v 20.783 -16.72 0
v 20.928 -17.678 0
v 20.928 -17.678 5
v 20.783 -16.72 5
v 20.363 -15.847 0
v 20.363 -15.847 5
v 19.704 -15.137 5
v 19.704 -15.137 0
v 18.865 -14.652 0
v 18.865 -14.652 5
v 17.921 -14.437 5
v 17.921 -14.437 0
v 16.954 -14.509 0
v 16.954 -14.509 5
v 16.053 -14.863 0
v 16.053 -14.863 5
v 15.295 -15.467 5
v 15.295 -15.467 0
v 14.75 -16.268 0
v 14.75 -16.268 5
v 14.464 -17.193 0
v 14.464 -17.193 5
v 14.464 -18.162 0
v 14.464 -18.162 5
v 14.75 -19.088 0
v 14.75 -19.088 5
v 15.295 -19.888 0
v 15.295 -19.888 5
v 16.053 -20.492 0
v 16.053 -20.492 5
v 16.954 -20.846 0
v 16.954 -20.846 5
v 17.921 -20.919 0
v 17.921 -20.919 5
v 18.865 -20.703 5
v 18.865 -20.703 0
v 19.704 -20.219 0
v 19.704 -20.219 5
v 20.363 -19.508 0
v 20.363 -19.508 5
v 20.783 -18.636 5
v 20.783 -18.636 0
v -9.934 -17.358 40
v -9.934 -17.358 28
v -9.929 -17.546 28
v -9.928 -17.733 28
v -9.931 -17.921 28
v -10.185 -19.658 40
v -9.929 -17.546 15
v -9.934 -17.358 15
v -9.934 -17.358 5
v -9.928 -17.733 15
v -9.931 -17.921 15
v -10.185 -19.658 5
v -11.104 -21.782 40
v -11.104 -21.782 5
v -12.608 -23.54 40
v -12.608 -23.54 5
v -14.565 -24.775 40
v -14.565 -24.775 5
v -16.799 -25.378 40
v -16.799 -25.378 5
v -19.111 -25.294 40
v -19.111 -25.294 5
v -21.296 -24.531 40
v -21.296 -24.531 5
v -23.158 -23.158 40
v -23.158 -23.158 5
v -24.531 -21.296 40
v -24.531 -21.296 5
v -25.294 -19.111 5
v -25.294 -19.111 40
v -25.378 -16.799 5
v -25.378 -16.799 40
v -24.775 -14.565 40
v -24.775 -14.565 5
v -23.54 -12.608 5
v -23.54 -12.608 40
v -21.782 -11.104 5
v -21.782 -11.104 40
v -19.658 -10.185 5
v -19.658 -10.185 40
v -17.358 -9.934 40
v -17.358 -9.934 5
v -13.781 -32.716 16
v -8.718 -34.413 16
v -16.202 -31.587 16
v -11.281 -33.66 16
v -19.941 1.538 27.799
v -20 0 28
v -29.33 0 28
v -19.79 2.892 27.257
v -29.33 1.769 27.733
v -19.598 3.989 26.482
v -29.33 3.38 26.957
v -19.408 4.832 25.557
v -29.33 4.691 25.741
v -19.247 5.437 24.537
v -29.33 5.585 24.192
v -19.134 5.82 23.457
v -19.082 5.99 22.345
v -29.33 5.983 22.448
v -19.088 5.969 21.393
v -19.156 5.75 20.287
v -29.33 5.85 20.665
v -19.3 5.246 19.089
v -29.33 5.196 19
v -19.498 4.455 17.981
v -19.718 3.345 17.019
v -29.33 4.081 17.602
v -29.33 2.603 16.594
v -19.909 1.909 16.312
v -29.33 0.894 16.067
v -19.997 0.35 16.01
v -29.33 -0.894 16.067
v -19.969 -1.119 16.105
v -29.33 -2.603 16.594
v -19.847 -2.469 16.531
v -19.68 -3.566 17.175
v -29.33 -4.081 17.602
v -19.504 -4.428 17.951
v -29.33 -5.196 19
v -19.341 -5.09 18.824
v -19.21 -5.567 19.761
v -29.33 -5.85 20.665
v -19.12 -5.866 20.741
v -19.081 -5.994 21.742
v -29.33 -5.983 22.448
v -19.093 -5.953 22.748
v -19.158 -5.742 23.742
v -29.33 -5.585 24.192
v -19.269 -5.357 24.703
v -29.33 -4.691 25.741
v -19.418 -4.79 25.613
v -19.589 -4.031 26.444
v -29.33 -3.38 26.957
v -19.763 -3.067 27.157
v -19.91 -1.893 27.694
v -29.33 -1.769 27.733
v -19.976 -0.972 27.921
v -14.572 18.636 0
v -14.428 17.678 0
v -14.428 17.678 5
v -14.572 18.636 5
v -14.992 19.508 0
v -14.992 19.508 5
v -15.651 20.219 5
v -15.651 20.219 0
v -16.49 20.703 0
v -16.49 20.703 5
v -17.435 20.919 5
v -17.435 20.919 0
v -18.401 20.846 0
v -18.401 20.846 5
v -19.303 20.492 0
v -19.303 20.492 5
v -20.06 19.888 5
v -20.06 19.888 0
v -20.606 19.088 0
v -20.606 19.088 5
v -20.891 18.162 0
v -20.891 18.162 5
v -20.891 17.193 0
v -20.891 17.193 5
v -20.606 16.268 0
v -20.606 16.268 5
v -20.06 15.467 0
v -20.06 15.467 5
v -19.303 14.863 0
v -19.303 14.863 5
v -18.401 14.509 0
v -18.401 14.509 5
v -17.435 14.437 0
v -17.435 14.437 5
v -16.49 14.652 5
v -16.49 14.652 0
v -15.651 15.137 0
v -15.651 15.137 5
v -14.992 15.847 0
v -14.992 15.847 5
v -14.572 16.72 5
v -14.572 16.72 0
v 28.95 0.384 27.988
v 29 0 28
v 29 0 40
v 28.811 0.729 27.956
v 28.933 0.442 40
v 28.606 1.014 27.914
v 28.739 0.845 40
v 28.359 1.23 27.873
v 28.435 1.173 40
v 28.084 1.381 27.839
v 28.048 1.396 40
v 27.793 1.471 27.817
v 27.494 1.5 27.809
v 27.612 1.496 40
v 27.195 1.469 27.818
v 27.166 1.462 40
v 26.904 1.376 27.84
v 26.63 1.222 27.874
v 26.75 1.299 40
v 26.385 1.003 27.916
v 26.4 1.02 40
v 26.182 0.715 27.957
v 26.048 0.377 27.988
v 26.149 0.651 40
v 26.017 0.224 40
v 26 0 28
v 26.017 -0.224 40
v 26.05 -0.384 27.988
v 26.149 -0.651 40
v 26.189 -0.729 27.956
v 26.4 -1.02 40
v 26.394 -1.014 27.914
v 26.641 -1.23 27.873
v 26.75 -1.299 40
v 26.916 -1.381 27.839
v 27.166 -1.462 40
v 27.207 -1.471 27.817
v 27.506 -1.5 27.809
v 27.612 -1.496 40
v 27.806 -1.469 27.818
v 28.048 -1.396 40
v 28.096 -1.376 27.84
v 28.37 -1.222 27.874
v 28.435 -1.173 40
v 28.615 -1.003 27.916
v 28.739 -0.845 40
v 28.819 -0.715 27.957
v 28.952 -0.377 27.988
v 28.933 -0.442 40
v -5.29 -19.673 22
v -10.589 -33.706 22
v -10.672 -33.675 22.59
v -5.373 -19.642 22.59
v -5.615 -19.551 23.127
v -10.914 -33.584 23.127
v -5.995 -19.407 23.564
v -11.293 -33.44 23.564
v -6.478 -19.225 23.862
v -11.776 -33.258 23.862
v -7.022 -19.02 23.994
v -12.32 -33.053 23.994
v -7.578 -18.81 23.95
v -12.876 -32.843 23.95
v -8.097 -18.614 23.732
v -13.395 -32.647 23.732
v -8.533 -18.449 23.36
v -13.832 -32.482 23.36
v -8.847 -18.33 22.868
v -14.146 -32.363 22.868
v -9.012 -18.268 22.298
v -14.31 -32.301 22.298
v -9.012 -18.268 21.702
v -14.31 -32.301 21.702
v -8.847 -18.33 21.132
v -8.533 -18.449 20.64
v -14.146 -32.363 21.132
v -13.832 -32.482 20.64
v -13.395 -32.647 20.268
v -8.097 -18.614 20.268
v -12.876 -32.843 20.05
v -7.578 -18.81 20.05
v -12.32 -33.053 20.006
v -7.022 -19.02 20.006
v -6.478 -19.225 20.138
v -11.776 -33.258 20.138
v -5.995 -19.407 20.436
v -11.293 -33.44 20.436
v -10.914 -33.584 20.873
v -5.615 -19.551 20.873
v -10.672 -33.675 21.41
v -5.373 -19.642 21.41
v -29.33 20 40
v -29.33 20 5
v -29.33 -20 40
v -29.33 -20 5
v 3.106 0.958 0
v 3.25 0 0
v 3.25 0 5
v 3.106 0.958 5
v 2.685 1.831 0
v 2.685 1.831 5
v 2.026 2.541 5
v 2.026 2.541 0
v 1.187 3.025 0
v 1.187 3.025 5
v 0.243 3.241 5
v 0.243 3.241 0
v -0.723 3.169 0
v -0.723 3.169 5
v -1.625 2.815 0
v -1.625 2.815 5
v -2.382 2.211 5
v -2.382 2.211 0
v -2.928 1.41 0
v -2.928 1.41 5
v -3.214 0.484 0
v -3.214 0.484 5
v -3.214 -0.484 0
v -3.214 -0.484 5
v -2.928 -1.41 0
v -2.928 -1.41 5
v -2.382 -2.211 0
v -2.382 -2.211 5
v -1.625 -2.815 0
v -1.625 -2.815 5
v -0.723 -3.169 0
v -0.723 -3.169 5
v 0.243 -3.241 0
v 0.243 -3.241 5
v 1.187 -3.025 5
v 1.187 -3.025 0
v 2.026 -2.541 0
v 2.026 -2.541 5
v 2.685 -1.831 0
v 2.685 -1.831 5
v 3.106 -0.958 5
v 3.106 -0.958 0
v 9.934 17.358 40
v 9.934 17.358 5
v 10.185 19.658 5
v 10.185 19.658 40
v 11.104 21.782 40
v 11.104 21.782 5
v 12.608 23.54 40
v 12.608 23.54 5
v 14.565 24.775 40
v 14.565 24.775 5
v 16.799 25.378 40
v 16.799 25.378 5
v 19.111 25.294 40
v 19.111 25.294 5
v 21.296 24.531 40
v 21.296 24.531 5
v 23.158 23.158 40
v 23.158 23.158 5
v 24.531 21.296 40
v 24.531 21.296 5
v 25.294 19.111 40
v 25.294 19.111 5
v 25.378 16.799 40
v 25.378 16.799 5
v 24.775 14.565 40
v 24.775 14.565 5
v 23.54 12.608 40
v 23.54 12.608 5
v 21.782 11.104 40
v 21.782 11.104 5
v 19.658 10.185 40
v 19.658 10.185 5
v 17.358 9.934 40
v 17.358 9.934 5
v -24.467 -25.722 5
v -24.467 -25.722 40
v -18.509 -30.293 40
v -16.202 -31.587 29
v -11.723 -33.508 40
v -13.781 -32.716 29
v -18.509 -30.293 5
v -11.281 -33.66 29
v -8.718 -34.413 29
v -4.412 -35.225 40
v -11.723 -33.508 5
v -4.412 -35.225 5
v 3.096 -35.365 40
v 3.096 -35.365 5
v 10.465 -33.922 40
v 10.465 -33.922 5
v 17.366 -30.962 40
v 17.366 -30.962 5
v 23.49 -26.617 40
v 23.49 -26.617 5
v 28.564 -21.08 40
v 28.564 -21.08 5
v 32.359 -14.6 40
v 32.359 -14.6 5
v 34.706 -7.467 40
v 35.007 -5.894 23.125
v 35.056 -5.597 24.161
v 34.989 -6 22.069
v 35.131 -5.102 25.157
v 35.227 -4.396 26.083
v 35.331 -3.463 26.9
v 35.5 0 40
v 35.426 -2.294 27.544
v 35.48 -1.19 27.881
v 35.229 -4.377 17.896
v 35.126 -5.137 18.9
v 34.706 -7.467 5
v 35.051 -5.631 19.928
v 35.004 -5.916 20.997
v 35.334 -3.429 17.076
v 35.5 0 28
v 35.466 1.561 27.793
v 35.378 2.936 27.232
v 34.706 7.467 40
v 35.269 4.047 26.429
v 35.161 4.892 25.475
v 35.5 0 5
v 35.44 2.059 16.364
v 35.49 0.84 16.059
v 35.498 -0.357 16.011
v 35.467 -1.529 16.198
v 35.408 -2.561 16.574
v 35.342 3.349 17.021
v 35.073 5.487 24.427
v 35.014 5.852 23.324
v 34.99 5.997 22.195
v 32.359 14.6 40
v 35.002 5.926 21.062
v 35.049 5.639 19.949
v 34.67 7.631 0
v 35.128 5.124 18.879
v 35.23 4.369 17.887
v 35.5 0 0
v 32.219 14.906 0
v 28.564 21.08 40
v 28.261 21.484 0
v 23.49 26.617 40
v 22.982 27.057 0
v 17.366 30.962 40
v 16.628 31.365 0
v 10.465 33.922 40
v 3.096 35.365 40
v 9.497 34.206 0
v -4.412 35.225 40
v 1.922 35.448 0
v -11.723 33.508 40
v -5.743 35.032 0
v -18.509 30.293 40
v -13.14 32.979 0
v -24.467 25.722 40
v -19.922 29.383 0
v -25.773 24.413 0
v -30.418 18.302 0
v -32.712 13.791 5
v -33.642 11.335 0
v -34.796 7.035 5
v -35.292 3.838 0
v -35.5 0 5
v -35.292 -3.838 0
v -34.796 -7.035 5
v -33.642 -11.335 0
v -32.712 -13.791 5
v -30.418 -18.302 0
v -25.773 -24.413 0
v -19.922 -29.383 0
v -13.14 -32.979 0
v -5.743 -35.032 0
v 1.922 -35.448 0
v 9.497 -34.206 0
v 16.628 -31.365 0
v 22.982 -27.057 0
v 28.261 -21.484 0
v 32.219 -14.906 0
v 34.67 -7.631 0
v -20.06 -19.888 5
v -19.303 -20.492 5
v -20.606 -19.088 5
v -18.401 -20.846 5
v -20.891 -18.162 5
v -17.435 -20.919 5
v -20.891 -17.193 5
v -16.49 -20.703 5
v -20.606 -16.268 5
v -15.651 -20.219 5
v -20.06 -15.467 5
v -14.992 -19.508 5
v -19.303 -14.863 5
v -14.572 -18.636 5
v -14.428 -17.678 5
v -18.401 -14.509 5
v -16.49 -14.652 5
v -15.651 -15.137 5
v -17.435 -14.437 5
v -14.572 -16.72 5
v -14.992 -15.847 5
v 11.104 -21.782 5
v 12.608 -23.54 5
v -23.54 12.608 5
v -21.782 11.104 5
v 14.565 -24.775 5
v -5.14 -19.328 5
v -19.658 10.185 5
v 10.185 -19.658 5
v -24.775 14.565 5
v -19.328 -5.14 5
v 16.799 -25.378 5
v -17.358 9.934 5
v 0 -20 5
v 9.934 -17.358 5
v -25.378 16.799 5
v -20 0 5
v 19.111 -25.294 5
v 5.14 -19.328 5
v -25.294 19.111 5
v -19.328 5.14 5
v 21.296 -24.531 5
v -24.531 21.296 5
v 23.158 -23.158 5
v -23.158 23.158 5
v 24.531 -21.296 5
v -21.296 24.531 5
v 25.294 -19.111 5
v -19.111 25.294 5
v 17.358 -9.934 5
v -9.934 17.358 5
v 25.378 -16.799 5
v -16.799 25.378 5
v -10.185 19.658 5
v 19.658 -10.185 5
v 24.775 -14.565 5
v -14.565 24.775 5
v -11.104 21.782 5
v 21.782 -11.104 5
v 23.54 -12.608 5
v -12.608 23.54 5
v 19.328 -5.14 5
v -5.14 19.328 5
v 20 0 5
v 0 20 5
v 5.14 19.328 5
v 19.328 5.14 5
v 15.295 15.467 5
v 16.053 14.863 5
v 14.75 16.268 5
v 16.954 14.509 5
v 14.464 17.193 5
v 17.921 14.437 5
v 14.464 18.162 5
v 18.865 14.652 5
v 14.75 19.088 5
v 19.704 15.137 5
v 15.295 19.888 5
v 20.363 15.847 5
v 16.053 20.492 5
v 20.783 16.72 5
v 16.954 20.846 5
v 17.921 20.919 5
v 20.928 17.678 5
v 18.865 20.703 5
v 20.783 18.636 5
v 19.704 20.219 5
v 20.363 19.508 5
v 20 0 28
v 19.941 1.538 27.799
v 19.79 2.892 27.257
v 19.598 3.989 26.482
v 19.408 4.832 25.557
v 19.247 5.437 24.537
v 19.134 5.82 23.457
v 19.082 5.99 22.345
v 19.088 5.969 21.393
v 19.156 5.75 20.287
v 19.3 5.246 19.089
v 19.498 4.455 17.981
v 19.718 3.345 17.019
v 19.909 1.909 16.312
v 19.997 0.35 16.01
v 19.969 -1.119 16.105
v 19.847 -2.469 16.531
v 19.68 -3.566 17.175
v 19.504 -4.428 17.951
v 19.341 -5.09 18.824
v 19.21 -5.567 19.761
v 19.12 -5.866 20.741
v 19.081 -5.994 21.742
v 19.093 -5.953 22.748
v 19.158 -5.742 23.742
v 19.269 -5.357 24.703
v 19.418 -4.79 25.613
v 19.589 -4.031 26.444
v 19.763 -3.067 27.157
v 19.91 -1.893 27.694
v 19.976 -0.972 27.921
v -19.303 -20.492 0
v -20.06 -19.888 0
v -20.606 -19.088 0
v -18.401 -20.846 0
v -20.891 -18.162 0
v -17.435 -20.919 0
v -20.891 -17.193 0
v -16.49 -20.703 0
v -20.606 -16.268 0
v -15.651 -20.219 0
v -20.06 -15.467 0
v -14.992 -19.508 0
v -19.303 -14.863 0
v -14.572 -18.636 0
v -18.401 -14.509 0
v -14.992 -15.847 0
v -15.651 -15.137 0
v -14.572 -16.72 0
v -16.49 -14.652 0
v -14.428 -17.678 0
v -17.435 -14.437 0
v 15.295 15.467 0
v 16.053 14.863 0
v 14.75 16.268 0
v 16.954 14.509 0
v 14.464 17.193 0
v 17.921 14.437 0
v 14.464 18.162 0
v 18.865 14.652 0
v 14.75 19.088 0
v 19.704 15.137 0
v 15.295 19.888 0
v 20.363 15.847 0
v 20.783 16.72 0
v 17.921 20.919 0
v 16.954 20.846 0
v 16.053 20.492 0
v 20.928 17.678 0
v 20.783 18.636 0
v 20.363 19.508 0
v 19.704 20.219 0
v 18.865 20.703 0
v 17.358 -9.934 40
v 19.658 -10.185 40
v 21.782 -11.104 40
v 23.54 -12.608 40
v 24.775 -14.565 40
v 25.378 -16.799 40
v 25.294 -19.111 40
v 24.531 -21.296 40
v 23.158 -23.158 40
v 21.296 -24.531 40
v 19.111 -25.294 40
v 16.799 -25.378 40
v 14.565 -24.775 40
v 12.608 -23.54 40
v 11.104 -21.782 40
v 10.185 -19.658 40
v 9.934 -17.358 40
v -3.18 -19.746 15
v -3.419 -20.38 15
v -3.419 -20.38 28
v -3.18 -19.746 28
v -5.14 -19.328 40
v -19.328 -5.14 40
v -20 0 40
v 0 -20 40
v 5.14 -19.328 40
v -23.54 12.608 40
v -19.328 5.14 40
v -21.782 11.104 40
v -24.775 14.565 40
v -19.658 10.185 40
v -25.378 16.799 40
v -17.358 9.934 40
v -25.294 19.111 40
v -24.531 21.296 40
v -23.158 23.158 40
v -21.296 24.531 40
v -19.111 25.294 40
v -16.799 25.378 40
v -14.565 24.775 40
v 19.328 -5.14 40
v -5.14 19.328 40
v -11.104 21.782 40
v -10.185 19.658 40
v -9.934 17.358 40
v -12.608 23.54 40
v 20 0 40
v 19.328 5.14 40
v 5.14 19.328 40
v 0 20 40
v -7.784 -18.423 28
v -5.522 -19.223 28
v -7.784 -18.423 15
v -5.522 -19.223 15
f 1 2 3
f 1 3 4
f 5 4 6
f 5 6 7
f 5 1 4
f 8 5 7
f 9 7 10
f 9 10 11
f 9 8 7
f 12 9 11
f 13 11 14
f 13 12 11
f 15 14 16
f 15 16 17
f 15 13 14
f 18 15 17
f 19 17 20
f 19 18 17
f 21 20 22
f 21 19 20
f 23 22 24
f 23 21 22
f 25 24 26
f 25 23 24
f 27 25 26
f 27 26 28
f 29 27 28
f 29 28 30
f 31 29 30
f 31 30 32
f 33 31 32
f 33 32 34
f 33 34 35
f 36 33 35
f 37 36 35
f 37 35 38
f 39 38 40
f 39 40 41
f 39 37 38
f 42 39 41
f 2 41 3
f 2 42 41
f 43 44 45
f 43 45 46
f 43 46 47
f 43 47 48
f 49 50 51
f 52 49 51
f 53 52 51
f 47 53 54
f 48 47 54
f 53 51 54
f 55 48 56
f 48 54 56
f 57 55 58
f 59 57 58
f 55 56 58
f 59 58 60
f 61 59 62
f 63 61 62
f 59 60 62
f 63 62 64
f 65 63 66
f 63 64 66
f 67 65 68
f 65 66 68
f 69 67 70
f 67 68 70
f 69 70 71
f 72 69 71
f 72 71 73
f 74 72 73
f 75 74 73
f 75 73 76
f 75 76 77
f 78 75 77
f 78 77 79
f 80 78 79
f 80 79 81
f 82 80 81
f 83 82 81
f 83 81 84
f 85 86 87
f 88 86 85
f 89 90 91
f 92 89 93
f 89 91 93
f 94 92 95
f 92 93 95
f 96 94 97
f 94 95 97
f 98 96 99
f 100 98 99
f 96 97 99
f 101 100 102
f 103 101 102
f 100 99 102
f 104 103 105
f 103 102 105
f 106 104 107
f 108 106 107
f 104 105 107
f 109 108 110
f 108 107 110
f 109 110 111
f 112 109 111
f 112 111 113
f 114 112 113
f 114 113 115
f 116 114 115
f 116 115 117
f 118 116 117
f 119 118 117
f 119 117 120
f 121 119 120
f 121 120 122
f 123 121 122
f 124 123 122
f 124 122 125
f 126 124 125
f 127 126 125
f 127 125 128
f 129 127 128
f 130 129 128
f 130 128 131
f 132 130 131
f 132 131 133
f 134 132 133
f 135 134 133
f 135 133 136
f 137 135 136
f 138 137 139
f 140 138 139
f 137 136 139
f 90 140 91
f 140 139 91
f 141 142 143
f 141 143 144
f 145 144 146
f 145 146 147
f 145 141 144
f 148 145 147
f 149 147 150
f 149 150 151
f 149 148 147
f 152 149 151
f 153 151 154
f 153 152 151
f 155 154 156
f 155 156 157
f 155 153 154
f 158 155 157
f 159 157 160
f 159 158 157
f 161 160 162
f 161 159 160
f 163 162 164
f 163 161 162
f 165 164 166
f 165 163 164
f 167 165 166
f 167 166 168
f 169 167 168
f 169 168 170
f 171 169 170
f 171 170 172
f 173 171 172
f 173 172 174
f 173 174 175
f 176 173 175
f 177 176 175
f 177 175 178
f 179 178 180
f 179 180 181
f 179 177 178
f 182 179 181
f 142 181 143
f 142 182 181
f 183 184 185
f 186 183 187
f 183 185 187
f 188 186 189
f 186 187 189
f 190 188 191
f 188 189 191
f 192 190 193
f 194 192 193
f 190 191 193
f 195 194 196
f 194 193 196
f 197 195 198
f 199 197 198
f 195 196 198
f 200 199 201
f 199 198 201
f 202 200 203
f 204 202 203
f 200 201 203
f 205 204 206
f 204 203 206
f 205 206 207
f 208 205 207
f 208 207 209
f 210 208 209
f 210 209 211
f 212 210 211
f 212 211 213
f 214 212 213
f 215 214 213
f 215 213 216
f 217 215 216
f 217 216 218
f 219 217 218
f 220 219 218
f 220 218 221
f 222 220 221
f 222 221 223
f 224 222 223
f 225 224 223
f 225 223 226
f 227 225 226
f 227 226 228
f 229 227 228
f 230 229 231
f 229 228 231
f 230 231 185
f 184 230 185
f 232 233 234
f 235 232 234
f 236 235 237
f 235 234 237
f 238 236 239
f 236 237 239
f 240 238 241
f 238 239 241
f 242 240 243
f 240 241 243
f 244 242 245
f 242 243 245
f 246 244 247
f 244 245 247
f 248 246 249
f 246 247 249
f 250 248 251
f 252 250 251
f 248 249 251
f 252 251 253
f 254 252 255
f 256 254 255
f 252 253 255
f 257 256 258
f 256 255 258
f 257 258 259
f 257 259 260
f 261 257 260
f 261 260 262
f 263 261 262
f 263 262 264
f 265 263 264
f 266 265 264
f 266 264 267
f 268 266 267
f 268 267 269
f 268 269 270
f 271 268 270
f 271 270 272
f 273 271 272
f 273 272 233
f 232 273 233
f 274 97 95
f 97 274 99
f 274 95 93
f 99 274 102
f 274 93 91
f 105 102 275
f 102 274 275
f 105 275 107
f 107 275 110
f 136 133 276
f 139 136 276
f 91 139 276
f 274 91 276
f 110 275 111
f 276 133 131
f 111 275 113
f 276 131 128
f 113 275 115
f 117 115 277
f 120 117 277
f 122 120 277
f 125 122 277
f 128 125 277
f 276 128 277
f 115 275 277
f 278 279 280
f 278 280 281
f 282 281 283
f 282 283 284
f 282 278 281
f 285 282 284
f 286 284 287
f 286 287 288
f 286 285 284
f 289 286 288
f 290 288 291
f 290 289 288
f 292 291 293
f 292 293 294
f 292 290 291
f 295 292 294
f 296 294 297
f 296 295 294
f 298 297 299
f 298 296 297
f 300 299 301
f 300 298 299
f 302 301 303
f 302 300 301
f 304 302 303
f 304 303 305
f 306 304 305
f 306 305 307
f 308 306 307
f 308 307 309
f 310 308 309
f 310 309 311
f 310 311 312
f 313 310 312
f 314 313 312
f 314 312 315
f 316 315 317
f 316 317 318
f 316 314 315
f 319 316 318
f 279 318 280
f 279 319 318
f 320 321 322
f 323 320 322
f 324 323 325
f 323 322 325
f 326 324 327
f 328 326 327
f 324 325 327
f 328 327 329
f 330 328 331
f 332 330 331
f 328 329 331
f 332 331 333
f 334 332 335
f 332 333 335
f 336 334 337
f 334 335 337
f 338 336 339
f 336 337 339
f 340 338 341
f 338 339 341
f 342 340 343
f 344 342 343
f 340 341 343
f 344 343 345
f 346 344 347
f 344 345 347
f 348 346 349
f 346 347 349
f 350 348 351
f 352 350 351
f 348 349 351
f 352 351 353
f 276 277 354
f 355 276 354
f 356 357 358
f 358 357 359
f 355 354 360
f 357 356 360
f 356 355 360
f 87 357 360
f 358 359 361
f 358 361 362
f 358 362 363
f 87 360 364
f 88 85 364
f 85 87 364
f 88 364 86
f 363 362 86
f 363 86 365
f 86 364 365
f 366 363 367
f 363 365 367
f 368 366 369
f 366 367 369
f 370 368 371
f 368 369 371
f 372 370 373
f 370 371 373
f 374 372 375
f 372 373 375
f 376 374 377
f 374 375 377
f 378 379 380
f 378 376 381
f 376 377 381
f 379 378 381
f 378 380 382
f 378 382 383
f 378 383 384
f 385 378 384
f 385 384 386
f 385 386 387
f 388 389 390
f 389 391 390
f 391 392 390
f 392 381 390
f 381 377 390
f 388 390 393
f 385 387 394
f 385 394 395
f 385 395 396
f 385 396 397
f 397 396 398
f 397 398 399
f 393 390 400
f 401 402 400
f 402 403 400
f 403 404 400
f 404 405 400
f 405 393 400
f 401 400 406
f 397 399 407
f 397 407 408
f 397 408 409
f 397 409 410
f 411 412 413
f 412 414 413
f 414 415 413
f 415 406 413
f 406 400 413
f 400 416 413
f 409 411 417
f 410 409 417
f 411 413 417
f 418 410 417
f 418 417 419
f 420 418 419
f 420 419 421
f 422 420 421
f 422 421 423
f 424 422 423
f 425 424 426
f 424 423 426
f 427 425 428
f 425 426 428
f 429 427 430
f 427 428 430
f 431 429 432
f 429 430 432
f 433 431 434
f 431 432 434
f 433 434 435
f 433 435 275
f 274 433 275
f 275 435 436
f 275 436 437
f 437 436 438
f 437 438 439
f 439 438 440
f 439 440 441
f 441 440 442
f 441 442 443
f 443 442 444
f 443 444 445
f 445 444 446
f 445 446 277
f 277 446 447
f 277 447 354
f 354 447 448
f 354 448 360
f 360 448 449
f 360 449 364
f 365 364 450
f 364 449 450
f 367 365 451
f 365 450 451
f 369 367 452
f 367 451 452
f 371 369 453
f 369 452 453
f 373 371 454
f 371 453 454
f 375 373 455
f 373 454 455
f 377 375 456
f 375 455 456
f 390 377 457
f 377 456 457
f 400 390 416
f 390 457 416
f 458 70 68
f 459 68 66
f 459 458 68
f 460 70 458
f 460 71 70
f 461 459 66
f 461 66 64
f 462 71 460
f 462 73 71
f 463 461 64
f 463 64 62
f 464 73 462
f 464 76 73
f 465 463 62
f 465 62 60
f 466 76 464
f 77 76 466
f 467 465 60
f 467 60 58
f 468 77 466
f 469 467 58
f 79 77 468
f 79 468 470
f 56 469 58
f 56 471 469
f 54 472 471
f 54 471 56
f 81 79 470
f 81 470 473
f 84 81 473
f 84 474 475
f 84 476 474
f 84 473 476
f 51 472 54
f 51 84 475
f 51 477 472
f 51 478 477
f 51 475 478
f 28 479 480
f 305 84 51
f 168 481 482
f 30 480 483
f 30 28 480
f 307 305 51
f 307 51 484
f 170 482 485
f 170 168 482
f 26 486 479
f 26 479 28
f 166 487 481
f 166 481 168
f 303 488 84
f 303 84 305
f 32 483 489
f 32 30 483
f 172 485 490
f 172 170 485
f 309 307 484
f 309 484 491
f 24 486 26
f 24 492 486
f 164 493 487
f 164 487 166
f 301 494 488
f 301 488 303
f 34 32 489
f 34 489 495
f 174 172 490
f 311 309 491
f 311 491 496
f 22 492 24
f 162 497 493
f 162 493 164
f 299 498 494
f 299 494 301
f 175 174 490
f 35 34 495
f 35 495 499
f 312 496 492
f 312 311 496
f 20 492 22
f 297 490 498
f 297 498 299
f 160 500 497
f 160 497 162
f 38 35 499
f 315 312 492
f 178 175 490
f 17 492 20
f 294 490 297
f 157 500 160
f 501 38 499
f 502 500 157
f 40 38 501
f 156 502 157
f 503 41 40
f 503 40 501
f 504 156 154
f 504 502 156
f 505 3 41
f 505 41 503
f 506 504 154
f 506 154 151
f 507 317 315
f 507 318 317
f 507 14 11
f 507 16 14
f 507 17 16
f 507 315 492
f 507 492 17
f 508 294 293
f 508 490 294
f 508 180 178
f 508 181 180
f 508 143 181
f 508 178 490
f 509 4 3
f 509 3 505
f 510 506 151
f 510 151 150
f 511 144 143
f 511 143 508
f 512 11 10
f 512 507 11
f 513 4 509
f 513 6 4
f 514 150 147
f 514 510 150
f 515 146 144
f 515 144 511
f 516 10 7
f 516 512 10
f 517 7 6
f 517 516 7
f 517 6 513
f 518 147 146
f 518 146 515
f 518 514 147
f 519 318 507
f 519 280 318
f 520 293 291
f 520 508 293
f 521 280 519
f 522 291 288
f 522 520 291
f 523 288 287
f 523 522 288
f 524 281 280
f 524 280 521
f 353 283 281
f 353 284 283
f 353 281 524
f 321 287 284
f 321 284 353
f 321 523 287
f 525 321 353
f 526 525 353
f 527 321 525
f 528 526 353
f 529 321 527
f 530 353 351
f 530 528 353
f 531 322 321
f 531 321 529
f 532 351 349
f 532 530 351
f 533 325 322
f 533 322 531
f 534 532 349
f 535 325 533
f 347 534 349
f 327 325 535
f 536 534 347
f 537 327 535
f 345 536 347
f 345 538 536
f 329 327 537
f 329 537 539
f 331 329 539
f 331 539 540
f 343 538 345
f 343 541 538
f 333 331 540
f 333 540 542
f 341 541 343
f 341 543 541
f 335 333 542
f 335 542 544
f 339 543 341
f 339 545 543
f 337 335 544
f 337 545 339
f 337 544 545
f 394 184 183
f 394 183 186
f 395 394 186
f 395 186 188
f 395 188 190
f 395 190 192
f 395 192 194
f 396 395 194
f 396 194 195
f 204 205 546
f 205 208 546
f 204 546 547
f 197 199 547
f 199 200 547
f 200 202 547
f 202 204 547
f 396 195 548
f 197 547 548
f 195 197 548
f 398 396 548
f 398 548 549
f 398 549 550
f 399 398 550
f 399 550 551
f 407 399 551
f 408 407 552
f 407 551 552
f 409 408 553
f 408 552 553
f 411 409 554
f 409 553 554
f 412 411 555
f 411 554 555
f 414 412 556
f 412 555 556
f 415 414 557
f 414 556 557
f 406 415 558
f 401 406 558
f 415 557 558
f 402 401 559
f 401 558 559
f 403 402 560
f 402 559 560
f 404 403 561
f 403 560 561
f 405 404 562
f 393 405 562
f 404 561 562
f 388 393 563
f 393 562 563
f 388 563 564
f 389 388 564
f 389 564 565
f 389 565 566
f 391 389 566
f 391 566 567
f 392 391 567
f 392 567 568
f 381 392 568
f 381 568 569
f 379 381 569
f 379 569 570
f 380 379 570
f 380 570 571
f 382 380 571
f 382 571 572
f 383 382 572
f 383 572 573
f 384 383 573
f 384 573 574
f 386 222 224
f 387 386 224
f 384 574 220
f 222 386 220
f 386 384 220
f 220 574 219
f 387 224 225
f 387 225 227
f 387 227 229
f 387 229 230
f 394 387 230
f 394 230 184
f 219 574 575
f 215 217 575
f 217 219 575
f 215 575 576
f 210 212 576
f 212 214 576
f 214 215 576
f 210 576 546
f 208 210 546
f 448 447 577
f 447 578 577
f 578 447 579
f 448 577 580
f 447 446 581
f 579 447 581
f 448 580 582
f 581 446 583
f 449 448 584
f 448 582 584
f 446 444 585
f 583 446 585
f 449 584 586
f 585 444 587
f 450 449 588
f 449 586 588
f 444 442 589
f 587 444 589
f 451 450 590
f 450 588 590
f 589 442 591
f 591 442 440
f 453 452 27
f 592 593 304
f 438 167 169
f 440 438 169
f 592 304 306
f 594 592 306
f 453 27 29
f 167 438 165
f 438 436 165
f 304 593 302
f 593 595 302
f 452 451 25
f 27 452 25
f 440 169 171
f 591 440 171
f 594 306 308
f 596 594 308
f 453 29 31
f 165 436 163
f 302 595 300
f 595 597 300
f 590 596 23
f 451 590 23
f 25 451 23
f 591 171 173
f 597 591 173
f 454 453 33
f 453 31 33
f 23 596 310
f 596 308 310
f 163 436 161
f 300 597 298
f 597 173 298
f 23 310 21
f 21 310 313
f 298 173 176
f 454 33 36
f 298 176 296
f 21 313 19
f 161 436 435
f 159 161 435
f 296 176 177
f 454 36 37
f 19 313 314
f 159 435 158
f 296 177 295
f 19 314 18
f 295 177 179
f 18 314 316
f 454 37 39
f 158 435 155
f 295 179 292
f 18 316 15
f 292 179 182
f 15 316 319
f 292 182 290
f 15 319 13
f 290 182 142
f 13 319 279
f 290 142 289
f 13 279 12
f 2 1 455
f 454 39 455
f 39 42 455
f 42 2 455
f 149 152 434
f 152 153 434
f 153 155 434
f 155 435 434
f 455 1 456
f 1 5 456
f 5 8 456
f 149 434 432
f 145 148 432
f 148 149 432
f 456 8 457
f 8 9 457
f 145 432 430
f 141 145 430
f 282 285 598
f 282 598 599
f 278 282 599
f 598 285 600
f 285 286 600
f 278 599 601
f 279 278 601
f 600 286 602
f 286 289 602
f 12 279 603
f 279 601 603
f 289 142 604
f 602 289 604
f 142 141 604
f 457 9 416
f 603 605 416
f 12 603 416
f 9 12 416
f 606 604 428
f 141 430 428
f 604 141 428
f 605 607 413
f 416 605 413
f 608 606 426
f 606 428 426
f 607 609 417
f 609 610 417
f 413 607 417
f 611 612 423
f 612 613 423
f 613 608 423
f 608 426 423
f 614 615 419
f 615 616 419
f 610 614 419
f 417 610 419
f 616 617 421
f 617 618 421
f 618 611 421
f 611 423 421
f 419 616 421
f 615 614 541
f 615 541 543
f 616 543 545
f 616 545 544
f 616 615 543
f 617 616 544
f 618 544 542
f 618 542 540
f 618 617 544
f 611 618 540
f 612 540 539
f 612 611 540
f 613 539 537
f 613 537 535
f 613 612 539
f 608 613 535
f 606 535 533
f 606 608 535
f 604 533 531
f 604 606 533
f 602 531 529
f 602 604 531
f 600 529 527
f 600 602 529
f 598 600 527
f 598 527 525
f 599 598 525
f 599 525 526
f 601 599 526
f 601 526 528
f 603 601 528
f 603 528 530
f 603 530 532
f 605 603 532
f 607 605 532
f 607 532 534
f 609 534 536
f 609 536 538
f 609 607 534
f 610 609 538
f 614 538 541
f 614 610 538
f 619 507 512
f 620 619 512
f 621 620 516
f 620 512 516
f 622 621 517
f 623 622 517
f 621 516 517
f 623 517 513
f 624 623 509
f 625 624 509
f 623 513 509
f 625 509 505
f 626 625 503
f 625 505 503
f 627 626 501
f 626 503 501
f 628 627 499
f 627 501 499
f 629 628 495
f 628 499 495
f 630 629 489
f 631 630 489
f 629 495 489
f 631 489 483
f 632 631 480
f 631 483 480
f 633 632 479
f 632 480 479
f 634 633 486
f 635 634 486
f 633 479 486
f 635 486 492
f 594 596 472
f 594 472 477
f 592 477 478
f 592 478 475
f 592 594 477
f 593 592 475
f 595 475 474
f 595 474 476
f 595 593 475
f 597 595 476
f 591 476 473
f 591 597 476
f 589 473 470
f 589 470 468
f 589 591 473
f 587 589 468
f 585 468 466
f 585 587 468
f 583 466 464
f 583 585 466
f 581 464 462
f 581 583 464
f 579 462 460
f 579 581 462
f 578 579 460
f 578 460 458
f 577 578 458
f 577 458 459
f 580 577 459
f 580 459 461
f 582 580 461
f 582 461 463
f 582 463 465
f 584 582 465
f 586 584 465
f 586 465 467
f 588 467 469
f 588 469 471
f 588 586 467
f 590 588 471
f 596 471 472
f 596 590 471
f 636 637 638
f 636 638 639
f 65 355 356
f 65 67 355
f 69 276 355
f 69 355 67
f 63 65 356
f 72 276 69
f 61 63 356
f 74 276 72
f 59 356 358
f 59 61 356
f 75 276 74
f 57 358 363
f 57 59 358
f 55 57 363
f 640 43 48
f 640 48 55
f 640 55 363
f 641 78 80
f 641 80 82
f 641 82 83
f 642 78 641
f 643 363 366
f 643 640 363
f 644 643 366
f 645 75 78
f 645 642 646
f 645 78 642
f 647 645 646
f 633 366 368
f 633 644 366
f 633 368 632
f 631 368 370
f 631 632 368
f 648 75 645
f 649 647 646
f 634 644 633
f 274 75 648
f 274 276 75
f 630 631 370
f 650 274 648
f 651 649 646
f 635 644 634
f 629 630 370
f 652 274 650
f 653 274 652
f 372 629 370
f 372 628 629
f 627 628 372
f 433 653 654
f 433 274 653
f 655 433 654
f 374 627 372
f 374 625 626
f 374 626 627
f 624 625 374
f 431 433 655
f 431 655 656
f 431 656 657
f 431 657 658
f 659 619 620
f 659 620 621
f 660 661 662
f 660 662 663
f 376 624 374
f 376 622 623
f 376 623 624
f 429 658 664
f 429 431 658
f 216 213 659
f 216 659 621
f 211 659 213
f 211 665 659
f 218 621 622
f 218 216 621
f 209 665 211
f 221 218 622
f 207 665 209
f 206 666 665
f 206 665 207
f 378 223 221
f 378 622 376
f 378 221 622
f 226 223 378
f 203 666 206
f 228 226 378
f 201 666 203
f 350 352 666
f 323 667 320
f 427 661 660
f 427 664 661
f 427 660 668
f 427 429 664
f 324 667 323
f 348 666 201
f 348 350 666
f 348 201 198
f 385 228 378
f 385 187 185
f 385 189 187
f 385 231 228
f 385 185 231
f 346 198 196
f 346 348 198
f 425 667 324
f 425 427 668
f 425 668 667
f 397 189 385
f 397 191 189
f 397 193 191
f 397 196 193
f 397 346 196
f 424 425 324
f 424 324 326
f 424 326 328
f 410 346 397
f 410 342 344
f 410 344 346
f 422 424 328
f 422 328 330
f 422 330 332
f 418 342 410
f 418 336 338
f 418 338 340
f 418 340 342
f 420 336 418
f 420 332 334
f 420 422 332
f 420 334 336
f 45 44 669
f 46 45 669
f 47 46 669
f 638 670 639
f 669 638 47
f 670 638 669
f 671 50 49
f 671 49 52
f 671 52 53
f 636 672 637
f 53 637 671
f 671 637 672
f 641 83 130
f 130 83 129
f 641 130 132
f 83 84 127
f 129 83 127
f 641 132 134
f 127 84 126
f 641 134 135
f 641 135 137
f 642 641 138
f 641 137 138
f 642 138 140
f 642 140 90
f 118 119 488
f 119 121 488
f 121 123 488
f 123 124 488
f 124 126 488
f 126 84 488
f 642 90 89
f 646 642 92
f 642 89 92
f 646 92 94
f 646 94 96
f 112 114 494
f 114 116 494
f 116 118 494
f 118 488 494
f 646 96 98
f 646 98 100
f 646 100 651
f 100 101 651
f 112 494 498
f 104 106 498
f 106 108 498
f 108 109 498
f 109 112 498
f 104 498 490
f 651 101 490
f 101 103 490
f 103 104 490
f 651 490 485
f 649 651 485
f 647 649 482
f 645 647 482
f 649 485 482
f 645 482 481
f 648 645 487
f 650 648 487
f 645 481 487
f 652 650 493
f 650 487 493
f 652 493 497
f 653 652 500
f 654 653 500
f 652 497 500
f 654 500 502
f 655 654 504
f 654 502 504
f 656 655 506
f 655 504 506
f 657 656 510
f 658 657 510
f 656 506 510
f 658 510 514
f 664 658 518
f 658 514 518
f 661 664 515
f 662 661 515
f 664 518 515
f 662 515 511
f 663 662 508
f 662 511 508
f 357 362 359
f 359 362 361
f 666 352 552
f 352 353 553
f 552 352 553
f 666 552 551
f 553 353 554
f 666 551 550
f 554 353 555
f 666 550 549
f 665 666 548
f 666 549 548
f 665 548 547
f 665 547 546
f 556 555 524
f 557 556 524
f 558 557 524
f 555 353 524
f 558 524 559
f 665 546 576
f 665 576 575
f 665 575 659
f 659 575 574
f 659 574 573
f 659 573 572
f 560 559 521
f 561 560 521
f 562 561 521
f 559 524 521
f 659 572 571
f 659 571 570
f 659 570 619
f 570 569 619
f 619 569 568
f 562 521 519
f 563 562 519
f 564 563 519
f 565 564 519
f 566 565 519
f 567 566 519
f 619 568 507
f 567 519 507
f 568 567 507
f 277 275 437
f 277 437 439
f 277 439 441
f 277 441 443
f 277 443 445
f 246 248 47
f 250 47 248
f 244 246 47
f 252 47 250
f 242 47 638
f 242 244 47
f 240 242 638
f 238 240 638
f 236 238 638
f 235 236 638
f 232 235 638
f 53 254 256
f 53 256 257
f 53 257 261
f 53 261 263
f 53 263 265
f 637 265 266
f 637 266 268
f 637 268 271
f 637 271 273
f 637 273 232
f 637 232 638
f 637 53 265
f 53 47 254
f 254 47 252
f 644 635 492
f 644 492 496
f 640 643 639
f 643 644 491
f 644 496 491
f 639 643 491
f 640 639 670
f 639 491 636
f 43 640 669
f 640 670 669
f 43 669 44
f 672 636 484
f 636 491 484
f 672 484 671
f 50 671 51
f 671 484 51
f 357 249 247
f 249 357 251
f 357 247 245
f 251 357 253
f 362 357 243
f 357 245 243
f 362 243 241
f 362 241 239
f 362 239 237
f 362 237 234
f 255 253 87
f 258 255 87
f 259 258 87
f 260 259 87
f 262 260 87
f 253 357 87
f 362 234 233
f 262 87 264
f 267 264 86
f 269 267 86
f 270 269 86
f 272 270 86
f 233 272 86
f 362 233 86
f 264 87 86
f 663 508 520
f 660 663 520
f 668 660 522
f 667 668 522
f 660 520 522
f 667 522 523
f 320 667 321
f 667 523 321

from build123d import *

# Parameters (mm, degrees)
CROQUIS1_R                   = 35.5
CROQUIS1_R_2                 = 3.25
SALIENTE_EXTRUIR1_DEPTH      = 5
SALIENTE_EXTRUIR2_DEPTH      = 35
CROQUIS3_R                   = 6
CORTAR_EXTRUIR1_DEPTH        = 65.830018752
CORTAR_EXTRUIR2_REACH        = 42
CROQUIS4_R                   = 1.5
CORTAR_EXTRUIR_L_MINA1_START = 11
CORTAR_EXTRUIR_L_MINA1_DEPTH = 13
CORTAR_EXTRUIR3_REACH        = 83.025
CROQUIS6_R                   = 2
CORTAR_EXTRUIR_L_MINA2_START = 10
CORTAR_EXTRUIR_L_MINA2_DEPTH = 13


with BuildPart() as part:
    # Croquis1 → Saliente-Extruir1 (new body)
    with BuildSketch(Plane.XY):
        Circle(CROQUIS1_R)
        with Locations((17.67766953, 17.67766953)):
            Circle(CROQUIS1_R_2, mode=Mode.SUBTRACT)
        with Locations((17.67766953, -17.67766953)):
            Circle(CROQUIS1_R_2, mode=Mode.SUBTRACT)
        with Locations((-17.67766953, -17.67766953)):
            Circle(CROQUIS1_R_2, mode=Mode.SUBTRACT)
        with Locations((-17.67766953, 17.67766953)):
            Circle(CROQUIS1_R_2, mode=Mode.SUBTRACT)
        Circle(CROQUIS1_R_2, mode=Mode.SUBTRACT)
    extrude(amount=SALIENTE_EXTRUIR1_DEPTH)

    # Croquis2 → Saliente-Extruir2 (add)
    with BuildSketch(Plane.XY.offset(5)):
        with BuildLine():
            ThreePointArc((-29.330018752, -20), (35.5, 0), (-29.330018752, 20))
            Line((-29.330018752, 20), (-29.330018752, -20))
        make_face()
        with BuildLine():
            ThreePointArc((-9.934252718, 17.358301269), (0, 20), (9.934252718, 17.358301268))
            ThreePointArc((9.934252718, 17.358301268), (23.157747084, 23.157747084), (17.358301268, 9.934252718))
            ThreePointArc((17.358301268, 9.934252718), (20, 0), (17.358301268, -9.934252718))
            ThreePointArc((17.358301268, -9.934252718), (23.157747084, -23.157747084), (9.934252718, -17.358301268))
            ThreePointArc((9.934252718, -17.358301268), (0, -20), (-9.934252718, -17.358301268))
            ThreePointArc((-9.934252718, -17.358301268), (-23.157747084, -23.157747084), (-17.358301268, -9.934252718))
            ThreePointArc((-17.358301268, -9.934252718), (-20, 0), (-17.358301269, 9.934252718))
            ThreePointArc((-17.358301269, 9.934252718), (-23.157747084, 23.157747084), (-9.934252718, 17.358301268))
        make_face(mode=Mode.SUBTRACT)
    extrude(amount=SALIENTE_EXTRUIR2_DEPTH)

    # Croquis3 → Cortar-Extruir1 (cut, through all)
    with BuildSketch(Plane.ZY.offset(29.330018752)):
        with Locations((22, 0)):
            Circle(CROQUIS3_R)
    extrude(amount=-CORTAR_EXTRUIR1_DEPTH, mode=Mode.SUBTRACT)

    # Croquis4 → Cortar-Extruir2 (cut, up to next)
    with BuildSketch(Plane.XY.offset(40), mode=Mode.PRIVATE) as cortar_extruir2_sk1:
        with Locations((27.5, 0)):
            Circle(CROQUIS4_R)
    cortar_extruir2_tool1 = extrude(cortar_extruir2_sk1.sketch, amount=-CORTAR_EXTRUIR2_REACH, mode=Mode.PRIVATE) & part.part
    add(cortar_extruir2_tool1.solids().sort_by_distance((27.5, 0, 40))[0], mode=Mode.SUBTRACT)

    # Croquis5 → Cortar-Extruir-Lámina1 (cut)
    with BuildSketch(Plane.XY.offset(5).offset(CORTAR_EXTRUIR_L_MINA1_START)):
        Polygon((-16.202076443, -31.58706569), (-8.717795145, -34.41293431), (-9.4242623, -36.284004634), (-16.908543598, -33.458136015), align=None)
    extrude(amount=CORTAR_EXTRUIR_L_MINA1_DEPTH, mode=Mode.SUBTRACT)

    # Croquis6 → Cortar-Extruir3 (cut, up to next)
    with BuildSketch(Plane(origin=(-12.459935794, -33, 0), x_dir=(0.935535162, -0.353233577, 0), z_dir=(-0.353233577, -0.935535162, 0)), mode=Mode.PRIVATE) as cortar_extruir3_sk1:
        with Locations((0, 22)):
            Circle(CROQUIS6_R)
    cortar_extruir3_tool1 = extrude(cortar_extruir3_sk1.sketch, amount=-CORTAR_EXTRUIR3_REACH, mode=Mode.PRIVATE) & part.part
    add(cortar_extruir3_tool1.solids().sort_by_distance((-12.459936, -33, 22))[0], mode=Mode.SUBTRACT)

    # Croquis7 → Cortar-Extruir-Lámina2 (cut)
    with BuildSketch(Plane.XY.offset(5).offset(CORTAR_EXTRUIR_L_MINA2_START)):
        Polygon((-10.903572782, -17.554038257), (-3.419291484, -20.379906876), (-2.712824329, -18.508836552), (-10.197105627, -15.682967932), align=None)
    extrude(amount=CORTAR_EXTRUIR_L_MINA2_DEPTH, mode=Mode.SUBTRACT)


solid = part.part
